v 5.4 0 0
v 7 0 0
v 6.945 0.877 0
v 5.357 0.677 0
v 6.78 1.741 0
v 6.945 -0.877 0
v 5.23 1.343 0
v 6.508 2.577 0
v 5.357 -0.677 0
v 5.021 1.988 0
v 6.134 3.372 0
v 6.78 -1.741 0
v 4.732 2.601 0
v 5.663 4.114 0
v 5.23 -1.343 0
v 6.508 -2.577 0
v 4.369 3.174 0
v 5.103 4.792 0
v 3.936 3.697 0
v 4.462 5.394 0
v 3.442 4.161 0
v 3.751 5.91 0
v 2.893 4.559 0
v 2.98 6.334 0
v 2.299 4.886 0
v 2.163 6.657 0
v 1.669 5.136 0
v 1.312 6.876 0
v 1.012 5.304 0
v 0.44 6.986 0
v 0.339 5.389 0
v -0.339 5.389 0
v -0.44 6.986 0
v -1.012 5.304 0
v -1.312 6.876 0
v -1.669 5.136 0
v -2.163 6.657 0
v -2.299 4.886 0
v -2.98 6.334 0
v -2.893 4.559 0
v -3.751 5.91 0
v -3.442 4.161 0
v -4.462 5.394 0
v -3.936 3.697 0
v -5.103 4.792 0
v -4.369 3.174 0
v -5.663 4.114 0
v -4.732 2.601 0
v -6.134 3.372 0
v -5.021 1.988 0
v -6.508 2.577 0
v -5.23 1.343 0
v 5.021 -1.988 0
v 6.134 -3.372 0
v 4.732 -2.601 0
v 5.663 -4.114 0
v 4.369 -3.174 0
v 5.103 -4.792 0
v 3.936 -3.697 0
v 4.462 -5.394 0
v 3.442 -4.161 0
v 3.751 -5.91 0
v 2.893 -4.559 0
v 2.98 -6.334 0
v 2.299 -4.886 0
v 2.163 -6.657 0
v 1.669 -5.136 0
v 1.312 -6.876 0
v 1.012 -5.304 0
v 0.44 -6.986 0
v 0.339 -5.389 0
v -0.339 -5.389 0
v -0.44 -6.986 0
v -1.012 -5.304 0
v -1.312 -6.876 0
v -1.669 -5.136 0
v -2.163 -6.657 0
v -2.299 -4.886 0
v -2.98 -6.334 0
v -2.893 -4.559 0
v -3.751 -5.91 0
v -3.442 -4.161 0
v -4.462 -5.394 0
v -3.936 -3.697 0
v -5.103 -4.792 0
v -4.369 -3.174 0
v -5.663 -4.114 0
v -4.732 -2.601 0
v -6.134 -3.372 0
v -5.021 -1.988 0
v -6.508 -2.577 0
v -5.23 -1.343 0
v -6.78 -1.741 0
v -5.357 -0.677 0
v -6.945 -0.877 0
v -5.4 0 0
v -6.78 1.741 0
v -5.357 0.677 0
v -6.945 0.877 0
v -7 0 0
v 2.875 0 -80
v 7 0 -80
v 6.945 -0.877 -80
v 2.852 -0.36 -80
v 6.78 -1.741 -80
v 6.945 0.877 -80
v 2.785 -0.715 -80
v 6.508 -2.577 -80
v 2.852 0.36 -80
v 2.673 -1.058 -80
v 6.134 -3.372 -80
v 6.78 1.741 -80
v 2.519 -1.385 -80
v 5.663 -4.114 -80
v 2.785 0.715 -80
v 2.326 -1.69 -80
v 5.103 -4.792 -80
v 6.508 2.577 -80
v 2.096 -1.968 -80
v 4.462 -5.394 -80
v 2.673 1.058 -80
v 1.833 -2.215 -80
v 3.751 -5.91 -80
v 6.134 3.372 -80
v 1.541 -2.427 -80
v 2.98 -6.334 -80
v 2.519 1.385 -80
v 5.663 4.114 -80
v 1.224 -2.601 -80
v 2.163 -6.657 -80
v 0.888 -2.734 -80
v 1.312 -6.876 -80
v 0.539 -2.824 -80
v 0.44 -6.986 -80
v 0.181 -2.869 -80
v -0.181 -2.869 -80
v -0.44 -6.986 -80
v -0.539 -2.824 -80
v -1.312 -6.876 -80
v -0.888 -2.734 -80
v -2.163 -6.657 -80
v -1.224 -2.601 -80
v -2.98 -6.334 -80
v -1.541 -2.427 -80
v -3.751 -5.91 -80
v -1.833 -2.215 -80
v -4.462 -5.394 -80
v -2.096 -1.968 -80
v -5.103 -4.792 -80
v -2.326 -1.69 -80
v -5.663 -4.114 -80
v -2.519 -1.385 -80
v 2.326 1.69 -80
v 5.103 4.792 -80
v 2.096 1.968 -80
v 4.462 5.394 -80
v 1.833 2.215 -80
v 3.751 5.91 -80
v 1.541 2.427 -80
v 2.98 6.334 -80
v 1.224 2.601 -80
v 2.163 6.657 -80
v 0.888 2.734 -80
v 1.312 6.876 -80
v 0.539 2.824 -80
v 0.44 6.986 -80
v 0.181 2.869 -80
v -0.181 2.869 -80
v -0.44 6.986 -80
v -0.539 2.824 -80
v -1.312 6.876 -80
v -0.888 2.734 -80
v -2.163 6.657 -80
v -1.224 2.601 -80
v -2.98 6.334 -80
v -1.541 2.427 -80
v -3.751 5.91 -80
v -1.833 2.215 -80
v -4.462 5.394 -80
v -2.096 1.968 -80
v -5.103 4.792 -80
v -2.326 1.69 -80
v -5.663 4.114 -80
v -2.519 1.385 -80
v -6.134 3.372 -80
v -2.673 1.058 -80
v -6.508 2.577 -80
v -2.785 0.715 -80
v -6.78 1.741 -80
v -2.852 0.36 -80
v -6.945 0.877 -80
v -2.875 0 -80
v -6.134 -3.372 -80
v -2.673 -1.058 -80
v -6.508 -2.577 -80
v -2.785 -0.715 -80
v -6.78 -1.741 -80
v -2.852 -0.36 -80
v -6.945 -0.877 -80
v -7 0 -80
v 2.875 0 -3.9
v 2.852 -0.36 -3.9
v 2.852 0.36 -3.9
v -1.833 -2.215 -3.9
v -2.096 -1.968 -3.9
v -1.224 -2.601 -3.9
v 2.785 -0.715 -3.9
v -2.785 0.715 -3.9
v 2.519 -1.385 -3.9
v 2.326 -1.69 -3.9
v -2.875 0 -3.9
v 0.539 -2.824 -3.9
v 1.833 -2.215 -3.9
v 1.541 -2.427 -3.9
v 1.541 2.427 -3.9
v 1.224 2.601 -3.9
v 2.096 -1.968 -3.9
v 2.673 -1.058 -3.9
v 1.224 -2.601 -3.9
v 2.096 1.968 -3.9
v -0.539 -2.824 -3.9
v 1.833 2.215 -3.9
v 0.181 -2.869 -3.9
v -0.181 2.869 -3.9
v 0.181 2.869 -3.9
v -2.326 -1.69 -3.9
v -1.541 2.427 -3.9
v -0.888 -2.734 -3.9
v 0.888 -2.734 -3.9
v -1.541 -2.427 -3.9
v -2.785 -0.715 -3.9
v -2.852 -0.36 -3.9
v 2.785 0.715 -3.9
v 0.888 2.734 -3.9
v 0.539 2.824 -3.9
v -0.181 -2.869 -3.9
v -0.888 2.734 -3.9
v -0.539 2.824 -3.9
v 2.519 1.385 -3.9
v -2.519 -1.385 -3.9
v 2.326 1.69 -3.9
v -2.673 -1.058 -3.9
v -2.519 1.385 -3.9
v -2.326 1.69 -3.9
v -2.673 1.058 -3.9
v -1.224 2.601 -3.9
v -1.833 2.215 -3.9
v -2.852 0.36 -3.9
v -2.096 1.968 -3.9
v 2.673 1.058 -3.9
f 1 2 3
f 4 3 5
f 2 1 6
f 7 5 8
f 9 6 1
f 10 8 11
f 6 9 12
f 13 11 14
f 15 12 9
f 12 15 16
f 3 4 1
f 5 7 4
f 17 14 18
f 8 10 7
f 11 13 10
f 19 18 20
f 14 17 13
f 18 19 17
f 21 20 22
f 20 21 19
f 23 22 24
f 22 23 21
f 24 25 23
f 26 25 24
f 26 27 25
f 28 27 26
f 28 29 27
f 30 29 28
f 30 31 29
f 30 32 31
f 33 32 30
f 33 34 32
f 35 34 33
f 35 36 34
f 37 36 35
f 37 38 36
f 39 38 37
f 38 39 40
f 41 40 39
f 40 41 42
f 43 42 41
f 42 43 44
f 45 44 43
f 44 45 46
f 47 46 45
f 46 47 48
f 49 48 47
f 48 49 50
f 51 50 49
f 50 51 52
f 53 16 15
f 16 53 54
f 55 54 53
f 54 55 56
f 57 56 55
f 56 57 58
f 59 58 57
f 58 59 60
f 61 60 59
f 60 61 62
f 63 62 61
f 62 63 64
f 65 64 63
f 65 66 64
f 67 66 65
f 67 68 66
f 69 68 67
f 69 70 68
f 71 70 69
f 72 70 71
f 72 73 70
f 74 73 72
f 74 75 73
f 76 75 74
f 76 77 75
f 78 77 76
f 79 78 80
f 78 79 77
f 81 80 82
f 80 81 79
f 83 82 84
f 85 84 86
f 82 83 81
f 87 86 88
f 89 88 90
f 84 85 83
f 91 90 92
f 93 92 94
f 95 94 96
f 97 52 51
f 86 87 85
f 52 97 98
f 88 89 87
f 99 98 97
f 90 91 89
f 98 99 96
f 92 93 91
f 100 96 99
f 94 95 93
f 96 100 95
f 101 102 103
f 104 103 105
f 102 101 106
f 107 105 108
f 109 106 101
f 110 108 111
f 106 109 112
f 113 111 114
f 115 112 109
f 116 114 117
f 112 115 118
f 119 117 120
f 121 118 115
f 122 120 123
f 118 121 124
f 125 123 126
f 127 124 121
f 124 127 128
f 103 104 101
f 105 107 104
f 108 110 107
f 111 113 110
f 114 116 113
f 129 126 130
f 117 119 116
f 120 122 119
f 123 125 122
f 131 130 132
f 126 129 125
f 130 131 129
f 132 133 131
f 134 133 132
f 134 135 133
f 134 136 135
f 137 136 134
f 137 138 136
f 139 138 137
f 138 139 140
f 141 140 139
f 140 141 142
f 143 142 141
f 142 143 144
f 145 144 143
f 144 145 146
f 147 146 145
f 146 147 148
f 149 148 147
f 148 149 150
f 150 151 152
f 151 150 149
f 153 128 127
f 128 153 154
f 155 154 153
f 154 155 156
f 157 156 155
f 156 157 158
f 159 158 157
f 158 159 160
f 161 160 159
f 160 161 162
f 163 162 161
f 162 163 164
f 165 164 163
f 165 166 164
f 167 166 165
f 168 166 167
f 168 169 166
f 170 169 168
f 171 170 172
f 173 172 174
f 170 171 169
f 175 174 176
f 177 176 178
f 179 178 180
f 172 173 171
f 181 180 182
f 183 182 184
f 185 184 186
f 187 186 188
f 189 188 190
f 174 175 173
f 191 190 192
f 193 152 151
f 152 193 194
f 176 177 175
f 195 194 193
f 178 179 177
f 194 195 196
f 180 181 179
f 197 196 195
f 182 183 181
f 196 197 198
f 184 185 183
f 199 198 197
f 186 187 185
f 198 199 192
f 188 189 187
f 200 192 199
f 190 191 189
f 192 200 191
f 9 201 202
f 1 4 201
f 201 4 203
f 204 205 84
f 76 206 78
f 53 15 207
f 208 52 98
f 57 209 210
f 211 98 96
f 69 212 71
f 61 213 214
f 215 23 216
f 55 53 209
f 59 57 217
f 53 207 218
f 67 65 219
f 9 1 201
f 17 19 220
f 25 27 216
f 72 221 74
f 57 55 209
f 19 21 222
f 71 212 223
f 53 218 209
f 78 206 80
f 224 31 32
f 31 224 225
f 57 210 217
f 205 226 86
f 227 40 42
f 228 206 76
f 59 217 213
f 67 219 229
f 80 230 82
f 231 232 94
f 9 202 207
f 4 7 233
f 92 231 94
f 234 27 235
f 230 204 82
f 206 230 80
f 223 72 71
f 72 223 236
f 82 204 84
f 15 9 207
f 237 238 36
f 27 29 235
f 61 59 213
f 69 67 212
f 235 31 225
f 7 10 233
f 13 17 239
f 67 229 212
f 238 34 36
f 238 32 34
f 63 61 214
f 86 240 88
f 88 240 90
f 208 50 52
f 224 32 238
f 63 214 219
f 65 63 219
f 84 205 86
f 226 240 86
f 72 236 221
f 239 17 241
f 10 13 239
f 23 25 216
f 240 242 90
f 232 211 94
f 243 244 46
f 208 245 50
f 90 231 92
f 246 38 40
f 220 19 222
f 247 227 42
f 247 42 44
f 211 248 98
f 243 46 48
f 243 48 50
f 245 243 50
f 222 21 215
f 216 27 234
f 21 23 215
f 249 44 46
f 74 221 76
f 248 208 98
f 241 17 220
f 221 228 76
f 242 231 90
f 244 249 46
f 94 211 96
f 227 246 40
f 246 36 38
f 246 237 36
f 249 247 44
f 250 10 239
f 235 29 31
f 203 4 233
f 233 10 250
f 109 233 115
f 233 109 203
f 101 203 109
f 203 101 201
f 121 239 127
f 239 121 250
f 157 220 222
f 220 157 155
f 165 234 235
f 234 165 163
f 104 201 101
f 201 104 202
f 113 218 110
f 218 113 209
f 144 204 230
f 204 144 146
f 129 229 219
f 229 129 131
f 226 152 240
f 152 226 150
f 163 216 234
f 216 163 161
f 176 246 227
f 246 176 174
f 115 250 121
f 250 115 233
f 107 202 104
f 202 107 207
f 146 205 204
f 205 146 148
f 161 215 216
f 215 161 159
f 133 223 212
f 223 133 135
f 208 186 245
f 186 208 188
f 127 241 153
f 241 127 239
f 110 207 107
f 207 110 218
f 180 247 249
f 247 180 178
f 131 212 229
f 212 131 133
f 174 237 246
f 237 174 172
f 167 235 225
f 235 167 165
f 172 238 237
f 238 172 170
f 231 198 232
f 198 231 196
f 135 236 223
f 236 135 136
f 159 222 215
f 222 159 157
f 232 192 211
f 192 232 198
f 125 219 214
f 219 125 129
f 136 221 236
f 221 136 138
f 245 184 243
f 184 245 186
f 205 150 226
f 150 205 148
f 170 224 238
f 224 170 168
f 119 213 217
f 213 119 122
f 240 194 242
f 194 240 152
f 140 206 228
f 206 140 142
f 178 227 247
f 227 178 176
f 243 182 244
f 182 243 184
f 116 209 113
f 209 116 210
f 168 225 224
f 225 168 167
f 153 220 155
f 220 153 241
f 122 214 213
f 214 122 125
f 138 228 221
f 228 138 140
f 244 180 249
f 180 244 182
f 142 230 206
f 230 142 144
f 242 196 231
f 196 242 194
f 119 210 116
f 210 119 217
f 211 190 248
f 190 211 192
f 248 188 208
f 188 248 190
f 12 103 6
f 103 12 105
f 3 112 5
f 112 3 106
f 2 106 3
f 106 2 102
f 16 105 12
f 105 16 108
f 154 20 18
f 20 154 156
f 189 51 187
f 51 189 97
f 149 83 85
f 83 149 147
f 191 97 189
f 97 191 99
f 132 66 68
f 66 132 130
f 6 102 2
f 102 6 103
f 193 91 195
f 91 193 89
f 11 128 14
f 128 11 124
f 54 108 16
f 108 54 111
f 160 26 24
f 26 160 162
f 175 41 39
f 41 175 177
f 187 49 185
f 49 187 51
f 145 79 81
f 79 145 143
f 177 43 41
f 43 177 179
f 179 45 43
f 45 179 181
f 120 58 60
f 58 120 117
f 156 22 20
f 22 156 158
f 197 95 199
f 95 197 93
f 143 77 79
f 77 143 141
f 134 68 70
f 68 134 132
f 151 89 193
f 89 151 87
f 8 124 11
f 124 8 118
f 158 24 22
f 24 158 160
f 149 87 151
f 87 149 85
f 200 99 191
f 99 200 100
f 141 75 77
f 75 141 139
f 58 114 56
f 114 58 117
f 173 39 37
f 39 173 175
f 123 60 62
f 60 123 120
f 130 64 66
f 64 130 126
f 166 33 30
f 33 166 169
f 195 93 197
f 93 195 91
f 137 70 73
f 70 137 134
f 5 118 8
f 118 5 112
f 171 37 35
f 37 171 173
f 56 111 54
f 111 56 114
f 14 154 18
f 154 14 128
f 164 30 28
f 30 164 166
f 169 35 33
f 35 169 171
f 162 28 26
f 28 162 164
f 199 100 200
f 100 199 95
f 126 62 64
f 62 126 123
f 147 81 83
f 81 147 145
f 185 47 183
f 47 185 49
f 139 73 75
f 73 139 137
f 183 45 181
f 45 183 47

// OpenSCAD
$fn = 50;


difference() {
	union() {
		translate(v = [0, 0, -80.0000000000]) {
			cylinder(h = 80, r = 7.0000000000);
		}
		cylinder(h = 0, r = 17.0000000000);
	}
	union() {
		translate(v = [0, 0, 0]) {
			rotate(a = [0, 0, 0]) {
				difference() {
					union() {
						#translate(v = [0, 0, -80.0000000000]) {
							cylinder(h = 80, r = 2.6000000000);
						}
						#translate(v = [0, 0, -3.9000000000]) {
							cylinder(h = 3.9000000000, r = 7.0000000000, r1 = 2.8750000000, r2 = 5.4000000000);
						}
						#translate(v = [0, 0, -80.0000000000]) {
							cylinder(h = 80, r = 2.8750000000);
						}
						#translate(v = [0, 0, -80.0000000000]) {
							cylinder(h = 80, r = 2.6000000000);
						}
					}
					union();
				}
			}
		}
	}
}
